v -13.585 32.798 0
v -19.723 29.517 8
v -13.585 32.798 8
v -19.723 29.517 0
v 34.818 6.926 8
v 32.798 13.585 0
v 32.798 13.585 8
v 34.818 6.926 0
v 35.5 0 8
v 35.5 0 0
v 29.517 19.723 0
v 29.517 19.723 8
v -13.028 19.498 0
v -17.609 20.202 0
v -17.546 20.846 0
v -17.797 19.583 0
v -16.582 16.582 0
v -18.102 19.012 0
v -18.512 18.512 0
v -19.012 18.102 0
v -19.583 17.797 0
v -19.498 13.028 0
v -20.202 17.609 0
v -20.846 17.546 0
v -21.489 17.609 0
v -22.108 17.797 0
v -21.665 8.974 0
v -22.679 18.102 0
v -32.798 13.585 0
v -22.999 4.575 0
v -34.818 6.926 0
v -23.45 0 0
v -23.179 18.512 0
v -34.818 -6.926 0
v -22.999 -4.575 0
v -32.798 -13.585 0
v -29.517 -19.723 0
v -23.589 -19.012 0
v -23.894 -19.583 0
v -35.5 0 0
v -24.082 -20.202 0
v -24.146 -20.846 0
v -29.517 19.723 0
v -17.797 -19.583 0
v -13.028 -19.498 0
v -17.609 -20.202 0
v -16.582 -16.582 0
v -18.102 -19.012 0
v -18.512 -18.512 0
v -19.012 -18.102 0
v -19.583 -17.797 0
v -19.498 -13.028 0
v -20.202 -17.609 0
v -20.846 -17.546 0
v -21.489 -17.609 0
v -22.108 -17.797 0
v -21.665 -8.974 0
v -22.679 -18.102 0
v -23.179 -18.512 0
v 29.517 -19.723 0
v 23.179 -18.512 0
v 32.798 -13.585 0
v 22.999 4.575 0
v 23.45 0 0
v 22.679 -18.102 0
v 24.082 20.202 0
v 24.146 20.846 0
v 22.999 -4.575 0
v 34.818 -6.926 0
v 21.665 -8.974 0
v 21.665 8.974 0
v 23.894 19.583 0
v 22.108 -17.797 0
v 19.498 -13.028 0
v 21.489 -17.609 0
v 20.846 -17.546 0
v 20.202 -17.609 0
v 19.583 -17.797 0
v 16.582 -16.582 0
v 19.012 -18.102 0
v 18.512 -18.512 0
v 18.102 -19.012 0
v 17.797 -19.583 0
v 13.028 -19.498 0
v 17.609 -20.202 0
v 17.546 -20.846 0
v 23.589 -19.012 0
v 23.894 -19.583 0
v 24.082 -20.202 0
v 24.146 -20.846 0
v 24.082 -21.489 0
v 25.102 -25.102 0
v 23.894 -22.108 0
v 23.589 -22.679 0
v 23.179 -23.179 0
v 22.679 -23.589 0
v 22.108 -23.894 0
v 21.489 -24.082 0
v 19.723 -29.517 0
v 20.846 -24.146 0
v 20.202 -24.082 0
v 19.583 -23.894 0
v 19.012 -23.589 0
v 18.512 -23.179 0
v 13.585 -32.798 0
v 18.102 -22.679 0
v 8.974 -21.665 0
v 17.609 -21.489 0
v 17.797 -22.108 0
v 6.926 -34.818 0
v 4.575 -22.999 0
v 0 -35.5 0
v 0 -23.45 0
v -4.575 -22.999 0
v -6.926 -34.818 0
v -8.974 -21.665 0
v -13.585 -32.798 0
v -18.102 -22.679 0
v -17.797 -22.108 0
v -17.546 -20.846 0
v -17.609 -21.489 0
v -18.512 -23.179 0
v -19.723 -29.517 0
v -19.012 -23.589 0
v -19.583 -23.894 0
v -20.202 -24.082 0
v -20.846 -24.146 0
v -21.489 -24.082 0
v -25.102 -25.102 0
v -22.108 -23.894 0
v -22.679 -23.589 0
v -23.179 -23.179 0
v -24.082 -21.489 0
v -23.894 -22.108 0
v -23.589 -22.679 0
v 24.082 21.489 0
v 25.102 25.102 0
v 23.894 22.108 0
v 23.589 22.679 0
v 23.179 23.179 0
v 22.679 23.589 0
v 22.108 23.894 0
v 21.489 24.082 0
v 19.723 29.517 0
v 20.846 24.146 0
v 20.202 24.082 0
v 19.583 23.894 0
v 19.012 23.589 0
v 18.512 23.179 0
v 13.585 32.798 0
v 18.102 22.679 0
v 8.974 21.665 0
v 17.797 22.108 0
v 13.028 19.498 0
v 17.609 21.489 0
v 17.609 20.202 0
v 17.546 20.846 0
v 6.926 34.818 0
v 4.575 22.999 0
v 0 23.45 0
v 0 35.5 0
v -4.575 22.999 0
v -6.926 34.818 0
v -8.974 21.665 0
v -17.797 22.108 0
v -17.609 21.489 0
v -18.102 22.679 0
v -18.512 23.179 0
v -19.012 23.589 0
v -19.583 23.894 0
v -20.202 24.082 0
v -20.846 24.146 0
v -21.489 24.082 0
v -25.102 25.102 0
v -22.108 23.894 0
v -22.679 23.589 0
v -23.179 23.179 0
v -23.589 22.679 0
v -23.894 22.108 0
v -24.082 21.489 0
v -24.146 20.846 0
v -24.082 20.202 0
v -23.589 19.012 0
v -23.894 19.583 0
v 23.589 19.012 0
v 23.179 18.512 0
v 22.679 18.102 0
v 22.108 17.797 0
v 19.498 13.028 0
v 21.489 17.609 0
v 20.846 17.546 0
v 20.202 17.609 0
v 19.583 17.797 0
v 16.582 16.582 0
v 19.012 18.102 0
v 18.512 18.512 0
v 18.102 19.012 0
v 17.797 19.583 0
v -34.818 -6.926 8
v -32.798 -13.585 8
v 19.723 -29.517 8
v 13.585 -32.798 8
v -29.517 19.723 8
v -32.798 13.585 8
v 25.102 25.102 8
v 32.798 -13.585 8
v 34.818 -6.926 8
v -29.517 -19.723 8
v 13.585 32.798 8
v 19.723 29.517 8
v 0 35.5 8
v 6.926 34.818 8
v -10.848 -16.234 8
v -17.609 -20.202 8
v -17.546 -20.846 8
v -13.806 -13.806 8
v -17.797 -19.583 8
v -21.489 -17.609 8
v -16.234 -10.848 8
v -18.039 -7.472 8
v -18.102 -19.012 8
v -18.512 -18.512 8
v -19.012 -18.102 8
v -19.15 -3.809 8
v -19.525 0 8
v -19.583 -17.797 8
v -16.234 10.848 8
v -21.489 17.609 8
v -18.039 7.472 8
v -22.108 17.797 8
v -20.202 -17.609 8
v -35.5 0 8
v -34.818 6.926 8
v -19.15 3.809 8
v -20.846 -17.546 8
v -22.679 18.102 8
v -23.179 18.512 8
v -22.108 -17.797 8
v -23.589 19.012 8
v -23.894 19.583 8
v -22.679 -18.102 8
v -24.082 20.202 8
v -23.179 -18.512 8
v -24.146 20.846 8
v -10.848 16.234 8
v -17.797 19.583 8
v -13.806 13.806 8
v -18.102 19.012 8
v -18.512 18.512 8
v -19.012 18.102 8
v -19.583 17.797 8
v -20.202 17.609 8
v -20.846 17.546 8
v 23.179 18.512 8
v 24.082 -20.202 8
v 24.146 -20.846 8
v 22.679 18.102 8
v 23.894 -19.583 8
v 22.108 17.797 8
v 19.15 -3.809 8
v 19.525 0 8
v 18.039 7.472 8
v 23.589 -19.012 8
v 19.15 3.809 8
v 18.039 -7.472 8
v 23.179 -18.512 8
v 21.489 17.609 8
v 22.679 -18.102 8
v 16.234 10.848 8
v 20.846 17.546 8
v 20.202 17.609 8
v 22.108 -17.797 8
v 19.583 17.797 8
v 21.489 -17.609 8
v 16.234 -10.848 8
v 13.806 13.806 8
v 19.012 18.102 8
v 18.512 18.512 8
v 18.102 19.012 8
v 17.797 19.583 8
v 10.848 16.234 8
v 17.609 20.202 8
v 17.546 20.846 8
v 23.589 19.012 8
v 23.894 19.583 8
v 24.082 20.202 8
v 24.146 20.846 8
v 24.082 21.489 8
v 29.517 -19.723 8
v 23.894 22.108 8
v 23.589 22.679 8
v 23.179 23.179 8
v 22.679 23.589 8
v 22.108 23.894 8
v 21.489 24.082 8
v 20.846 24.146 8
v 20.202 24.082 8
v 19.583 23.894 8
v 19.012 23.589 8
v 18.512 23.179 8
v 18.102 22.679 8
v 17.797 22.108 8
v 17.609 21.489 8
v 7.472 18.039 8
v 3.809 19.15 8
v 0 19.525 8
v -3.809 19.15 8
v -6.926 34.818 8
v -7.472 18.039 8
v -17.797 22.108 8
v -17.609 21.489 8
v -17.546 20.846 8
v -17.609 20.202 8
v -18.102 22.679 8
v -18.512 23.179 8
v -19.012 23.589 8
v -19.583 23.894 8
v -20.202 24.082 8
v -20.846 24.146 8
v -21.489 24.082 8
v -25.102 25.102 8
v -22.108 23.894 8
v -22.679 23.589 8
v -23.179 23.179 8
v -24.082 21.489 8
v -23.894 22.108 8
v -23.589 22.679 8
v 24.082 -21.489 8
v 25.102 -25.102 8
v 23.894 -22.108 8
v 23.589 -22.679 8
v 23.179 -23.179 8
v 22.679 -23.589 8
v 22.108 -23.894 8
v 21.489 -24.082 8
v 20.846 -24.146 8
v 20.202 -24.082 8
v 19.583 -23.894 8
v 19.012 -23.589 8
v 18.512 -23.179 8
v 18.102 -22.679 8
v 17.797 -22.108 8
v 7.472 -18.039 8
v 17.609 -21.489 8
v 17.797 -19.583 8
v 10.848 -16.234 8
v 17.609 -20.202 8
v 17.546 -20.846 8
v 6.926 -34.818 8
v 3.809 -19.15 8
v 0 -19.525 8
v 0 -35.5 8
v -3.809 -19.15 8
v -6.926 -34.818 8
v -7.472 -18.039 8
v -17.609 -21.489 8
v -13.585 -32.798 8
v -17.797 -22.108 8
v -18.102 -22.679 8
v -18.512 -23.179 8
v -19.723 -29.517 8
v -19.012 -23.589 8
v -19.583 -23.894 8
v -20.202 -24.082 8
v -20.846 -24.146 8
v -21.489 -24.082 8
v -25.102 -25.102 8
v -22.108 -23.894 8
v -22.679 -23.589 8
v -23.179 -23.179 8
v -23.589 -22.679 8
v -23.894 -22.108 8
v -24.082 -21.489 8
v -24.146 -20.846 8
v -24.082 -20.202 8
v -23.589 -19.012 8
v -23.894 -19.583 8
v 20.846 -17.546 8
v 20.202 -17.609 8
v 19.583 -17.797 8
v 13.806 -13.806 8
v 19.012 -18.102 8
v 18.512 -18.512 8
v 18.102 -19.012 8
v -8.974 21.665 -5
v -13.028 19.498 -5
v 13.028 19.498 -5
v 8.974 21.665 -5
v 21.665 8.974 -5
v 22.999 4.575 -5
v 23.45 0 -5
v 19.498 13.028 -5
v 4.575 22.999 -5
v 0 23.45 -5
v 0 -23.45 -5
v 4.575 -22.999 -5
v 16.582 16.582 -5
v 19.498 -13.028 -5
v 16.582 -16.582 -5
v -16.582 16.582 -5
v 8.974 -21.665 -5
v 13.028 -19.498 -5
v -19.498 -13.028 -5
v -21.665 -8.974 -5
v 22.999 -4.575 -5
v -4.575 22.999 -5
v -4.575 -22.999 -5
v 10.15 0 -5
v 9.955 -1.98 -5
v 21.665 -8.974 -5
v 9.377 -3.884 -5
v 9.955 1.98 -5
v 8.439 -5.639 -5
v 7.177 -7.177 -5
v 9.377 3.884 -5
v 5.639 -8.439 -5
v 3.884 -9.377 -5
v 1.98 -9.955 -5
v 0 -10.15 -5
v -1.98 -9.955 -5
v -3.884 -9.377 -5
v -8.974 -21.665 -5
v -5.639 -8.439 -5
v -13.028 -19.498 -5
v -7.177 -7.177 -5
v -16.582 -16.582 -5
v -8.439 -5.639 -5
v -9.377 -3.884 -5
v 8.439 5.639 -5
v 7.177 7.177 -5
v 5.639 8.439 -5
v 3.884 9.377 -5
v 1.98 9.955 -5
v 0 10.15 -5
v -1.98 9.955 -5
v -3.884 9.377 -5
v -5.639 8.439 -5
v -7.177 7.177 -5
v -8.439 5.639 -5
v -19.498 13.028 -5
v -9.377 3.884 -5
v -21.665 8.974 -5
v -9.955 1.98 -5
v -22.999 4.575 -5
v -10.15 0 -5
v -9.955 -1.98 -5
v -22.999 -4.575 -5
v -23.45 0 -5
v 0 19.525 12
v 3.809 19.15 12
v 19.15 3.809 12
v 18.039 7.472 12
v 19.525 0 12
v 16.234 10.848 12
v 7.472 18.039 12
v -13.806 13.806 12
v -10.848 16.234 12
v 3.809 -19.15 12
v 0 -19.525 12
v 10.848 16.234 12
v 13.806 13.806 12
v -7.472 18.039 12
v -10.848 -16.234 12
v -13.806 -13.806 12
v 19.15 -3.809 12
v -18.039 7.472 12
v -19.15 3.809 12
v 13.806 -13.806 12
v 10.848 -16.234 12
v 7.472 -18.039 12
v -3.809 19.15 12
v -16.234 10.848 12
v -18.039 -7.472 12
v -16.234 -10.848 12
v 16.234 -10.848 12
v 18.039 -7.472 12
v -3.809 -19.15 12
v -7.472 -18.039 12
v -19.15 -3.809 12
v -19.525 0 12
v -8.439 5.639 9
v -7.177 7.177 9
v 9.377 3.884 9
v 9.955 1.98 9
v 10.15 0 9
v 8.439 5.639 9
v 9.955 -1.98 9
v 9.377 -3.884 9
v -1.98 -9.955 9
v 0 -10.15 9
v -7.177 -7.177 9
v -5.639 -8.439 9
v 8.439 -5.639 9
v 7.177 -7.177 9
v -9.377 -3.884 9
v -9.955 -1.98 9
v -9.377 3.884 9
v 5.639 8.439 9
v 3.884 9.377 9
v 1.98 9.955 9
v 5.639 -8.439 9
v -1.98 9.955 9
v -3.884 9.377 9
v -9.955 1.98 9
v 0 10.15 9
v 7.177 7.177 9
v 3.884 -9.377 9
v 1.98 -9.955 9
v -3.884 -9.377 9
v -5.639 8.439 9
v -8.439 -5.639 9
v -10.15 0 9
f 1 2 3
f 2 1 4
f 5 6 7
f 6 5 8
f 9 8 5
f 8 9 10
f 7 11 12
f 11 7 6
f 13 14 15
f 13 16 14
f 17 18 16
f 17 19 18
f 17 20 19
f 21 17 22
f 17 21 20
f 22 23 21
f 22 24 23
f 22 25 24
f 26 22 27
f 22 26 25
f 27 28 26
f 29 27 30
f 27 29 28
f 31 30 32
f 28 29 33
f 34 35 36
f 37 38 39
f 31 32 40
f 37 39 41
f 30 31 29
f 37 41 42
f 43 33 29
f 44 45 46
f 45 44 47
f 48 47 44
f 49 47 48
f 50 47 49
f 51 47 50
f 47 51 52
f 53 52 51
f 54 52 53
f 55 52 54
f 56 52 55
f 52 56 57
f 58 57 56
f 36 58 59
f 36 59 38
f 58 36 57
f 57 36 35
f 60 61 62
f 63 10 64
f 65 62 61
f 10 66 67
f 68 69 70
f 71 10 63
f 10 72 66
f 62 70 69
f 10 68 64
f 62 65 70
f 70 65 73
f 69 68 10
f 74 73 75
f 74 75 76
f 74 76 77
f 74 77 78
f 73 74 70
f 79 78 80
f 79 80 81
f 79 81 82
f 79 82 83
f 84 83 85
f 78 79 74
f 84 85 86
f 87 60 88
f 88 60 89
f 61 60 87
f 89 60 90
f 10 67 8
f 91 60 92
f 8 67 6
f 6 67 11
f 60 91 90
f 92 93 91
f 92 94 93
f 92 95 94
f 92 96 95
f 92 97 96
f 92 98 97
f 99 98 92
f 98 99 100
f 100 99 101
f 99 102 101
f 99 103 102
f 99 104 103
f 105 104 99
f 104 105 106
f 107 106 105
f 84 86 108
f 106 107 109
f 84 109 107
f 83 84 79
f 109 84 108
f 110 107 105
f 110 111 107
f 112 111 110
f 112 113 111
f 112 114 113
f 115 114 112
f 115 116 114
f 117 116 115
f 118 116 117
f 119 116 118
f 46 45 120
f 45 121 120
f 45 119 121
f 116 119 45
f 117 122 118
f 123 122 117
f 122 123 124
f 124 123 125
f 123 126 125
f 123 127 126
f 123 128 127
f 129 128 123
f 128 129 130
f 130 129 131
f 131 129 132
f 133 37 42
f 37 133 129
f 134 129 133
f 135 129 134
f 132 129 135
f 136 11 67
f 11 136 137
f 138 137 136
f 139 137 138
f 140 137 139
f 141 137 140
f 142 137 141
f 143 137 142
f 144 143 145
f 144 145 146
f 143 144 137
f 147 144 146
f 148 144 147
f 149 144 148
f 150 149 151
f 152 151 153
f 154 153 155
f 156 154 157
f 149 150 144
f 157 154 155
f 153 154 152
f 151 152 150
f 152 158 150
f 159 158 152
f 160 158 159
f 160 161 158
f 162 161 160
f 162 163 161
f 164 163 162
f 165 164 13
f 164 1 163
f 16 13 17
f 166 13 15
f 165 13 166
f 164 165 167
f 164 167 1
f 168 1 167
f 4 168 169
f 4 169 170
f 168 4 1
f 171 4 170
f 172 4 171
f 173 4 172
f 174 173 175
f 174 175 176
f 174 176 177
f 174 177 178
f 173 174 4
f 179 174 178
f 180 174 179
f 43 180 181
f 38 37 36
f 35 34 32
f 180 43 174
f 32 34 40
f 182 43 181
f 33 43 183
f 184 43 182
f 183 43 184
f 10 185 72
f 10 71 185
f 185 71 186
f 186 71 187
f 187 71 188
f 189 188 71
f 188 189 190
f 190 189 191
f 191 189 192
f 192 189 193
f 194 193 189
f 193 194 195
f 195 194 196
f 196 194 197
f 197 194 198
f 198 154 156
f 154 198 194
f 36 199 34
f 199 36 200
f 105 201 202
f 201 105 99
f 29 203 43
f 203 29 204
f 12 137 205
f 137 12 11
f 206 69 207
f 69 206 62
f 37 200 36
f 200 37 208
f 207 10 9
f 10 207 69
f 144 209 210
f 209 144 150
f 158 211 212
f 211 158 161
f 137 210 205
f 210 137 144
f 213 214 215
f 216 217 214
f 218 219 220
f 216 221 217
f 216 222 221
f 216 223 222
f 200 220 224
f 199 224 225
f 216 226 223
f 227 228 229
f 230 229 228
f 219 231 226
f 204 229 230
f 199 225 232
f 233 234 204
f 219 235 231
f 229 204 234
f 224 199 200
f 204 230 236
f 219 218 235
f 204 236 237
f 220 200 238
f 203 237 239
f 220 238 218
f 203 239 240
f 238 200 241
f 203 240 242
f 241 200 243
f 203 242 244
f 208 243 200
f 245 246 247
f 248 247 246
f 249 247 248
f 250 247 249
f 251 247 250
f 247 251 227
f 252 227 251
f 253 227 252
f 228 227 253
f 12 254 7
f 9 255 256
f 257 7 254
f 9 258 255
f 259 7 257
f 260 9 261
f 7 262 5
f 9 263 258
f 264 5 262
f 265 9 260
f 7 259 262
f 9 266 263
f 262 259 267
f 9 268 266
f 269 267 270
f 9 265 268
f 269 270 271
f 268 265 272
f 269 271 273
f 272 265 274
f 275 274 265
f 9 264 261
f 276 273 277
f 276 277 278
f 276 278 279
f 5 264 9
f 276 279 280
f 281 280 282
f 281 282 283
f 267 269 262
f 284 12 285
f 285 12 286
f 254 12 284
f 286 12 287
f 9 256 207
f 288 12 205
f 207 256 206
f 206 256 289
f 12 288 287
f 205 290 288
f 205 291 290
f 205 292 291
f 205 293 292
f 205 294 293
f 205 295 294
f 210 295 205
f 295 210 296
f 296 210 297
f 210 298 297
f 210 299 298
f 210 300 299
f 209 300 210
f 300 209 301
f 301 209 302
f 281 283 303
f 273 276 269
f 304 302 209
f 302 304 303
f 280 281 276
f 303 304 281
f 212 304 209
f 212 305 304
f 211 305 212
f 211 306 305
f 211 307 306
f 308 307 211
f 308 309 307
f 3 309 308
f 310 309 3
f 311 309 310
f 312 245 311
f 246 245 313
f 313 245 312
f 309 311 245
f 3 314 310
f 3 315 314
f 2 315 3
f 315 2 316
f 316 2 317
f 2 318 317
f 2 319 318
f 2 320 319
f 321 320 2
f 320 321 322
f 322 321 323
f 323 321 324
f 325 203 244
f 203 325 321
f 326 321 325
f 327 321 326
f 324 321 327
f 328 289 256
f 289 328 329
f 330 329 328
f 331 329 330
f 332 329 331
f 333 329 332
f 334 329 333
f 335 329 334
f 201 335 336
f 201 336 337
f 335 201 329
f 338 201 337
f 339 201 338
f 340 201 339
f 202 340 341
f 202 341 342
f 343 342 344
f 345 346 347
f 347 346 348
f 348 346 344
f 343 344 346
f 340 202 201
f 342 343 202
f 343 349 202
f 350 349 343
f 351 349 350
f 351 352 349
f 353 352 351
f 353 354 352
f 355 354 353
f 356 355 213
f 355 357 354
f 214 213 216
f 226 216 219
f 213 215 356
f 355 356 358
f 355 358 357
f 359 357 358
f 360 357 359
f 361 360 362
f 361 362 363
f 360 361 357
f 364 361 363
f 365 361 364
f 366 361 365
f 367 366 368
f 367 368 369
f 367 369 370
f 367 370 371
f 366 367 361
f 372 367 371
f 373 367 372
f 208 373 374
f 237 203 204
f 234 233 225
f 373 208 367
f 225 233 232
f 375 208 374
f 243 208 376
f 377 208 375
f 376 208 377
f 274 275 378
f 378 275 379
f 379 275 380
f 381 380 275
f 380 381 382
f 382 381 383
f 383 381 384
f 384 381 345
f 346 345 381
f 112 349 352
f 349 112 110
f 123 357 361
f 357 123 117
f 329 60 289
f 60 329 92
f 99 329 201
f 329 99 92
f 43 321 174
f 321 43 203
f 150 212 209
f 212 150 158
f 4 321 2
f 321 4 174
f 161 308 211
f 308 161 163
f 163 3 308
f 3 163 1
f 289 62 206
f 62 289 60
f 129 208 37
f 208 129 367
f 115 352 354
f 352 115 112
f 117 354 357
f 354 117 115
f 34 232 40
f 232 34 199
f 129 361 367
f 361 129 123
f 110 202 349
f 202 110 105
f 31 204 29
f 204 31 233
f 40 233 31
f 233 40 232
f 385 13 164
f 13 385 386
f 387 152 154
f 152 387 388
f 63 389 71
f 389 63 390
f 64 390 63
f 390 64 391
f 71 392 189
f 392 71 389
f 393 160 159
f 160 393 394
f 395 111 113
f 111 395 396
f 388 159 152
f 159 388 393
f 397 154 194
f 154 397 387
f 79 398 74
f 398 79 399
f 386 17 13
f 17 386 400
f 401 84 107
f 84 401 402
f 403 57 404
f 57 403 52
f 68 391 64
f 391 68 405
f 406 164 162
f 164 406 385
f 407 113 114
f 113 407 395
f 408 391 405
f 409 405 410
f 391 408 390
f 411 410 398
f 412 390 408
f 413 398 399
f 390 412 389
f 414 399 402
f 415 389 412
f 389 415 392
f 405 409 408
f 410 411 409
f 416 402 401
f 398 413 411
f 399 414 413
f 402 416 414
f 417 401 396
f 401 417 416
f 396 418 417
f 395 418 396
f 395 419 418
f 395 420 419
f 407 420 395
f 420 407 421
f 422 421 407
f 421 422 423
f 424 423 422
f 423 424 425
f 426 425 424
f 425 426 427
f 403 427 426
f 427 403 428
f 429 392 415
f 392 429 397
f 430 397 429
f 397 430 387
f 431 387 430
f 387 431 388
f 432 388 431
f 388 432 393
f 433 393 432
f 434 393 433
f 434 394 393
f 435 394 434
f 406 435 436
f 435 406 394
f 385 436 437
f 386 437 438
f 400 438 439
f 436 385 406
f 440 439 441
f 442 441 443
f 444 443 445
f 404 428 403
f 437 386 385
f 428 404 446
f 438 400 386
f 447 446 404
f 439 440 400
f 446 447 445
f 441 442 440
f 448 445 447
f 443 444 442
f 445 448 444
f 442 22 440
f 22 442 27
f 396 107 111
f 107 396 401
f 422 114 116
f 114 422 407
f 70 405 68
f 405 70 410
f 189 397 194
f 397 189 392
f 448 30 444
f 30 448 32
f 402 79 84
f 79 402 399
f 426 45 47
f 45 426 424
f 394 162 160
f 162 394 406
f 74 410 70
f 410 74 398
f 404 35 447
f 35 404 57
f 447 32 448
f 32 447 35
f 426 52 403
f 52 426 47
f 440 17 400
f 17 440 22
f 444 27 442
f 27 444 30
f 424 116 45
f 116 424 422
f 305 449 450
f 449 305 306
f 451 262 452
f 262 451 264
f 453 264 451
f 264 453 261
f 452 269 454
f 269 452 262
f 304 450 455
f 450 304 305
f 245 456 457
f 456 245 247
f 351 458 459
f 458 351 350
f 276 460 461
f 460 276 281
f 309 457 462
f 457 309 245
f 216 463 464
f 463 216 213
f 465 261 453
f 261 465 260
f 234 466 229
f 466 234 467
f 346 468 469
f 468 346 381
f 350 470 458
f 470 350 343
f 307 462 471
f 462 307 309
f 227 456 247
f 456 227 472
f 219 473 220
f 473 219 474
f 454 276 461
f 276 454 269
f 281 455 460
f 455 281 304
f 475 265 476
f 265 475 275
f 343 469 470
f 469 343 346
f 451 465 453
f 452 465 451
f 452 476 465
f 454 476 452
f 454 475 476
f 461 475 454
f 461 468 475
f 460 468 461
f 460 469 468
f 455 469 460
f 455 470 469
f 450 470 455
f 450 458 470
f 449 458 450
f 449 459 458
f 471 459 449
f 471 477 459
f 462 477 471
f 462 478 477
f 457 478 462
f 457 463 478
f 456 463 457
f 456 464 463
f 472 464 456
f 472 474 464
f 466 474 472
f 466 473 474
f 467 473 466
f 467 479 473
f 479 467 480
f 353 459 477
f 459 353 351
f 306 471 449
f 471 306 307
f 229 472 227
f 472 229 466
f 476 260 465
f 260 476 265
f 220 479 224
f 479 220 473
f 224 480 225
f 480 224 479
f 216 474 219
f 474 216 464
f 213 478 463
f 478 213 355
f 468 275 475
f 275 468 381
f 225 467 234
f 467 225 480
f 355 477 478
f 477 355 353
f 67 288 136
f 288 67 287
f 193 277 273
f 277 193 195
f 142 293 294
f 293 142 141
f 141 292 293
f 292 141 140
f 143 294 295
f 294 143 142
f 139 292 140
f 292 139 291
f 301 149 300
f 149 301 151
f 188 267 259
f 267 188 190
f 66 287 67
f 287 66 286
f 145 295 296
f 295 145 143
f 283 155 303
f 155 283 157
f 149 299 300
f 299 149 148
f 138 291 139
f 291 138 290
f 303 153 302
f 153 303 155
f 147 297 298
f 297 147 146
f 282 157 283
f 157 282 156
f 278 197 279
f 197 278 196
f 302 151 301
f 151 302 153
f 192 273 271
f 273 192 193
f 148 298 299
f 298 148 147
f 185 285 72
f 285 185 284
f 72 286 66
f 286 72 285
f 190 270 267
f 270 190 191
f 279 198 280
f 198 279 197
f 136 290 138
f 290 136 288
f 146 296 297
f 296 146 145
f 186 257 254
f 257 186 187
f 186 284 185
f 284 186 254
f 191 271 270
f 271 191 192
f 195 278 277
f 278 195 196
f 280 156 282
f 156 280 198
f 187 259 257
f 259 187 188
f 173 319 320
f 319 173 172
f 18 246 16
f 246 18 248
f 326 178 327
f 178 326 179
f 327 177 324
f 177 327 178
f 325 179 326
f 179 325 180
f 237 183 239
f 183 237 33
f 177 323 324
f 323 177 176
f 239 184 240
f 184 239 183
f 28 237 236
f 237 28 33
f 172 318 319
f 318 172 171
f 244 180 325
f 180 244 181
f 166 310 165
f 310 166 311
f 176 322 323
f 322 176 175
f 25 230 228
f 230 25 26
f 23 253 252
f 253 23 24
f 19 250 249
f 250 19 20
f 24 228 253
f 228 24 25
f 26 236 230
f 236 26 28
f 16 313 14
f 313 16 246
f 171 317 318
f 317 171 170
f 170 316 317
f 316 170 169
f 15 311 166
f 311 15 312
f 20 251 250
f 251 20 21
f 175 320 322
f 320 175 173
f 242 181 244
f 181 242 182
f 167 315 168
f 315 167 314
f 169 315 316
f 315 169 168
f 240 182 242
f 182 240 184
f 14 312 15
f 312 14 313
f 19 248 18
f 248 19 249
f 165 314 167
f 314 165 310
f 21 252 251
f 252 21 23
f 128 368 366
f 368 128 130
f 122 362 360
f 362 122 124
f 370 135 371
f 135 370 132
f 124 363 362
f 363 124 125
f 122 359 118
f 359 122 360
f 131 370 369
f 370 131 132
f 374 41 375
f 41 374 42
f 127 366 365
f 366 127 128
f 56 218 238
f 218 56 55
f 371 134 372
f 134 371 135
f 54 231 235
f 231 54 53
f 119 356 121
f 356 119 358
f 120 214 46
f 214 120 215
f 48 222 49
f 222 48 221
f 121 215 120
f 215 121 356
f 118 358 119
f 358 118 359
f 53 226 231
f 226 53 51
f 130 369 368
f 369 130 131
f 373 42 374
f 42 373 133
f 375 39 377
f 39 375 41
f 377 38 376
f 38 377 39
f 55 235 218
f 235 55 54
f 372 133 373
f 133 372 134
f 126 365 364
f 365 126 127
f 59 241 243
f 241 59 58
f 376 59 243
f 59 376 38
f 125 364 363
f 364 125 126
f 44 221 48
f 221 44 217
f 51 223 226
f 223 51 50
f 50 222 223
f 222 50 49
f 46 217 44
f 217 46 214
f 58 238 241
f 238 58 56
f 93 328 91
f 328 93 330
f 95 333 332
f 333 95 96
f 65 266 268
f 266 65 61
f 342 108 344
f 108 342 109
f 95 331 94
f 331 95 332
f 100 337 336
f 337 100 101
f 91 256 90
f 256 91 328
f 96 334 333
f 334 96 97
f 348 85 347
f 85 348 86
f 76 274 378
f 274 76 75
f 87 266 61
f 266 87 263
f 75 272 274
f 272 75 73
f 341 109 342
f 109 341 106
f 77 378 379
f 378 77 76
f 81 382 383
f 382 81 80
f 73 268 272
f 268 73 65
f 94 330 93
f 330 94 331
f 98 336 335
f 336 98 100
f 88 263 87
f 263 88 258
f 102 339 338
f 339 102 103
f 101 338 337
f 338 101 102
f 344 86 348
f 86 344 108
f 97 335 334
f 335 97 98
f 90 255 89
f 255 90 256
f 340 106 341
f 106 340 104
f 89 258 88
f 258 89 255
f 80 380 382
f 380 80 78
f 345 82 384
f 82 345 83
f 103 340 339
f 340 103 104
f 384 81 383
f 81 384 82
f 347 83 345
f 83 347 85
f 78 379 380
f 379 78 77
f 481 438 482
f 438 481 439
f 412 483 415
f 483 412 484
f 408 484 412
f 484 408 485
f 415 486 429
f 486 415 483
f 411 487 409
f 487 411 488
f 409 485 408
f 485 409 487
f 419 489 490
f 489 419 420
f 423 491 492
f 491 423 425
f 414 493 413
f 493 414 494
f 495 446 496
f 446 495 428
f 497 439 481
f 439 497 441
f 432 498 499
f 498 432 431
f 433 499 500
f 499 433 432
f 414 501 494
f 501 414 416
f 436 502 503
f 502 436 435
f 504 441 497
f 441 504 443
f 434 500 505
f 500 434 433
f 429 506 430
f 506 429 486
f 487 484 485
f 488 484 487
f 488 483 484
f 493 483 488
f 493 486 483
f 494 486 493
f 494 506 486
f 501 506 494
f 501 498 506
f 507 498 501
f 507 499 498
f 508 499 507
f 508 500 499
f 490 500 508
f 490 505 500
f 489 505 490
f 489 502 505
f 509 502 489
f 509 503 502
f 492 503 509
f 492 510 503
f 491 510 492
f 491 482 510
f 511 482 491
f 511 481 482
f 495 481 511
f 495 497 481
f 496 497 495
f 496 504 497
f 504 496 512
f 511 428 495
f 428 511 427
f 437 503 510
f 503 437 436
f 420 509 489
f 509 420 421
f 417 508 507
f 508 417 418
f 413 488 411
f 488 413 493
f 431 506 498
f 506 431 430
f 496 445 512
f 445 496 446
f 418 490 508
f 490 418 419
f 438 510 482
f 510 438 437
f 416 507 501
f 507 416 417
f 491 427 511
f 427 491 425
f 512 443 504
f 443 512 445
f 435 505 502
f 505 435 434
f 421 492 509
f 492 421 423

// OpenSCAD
$fn = 32;

// ----------------------------------------------------------------------
// Retaining cap: 6204 cover, 71 mm, spigot 46.9 mm
// ----------------------------------------------------------------------

// --- parameters (mm) ---
cap_d = 71;               // cover diameter
cap_t = 8;                // cover thickness
lip_d = 46.9;             // spigot that enters the housing
lip_h = 5;                // spigot height
shaft_d = 20.3;           // shaft opening
bolt_d = 6.6;             // bolt clearance
bolt_r = 29.48;           // bolt circle radius
dome_h = 4;               // raised centre

module cover() {
  cylinder(h = cap_t, d = cap_d);
}

module spigot() {
  /* sunk 1 mm into the cover; the spigot sets the overall height */
  translate([0, 0, -lip_h]) cylinder(h = lip_h + 1, d = lip_d);
}

module dome() {
  translate([0, 0, cap_t - 1]) cylinder(h = dome_h + 1, d = cap_d * 0.55);
}

difference() {
  union() {
    cover();
    spigot();
    dome();
  }
  for (i = [0 : 3]) rotate([0, 0, 45 + i * 90]) translate([bolt_r, 0, -lip_h - 1])
    cylinder(h = lip_h + cap_t + 2, d = bolt_d);
  translate([0, 0, -lip_h - 1]) cylinder(h = lip_h + cap_t + 2, d = shaft_d);
}
